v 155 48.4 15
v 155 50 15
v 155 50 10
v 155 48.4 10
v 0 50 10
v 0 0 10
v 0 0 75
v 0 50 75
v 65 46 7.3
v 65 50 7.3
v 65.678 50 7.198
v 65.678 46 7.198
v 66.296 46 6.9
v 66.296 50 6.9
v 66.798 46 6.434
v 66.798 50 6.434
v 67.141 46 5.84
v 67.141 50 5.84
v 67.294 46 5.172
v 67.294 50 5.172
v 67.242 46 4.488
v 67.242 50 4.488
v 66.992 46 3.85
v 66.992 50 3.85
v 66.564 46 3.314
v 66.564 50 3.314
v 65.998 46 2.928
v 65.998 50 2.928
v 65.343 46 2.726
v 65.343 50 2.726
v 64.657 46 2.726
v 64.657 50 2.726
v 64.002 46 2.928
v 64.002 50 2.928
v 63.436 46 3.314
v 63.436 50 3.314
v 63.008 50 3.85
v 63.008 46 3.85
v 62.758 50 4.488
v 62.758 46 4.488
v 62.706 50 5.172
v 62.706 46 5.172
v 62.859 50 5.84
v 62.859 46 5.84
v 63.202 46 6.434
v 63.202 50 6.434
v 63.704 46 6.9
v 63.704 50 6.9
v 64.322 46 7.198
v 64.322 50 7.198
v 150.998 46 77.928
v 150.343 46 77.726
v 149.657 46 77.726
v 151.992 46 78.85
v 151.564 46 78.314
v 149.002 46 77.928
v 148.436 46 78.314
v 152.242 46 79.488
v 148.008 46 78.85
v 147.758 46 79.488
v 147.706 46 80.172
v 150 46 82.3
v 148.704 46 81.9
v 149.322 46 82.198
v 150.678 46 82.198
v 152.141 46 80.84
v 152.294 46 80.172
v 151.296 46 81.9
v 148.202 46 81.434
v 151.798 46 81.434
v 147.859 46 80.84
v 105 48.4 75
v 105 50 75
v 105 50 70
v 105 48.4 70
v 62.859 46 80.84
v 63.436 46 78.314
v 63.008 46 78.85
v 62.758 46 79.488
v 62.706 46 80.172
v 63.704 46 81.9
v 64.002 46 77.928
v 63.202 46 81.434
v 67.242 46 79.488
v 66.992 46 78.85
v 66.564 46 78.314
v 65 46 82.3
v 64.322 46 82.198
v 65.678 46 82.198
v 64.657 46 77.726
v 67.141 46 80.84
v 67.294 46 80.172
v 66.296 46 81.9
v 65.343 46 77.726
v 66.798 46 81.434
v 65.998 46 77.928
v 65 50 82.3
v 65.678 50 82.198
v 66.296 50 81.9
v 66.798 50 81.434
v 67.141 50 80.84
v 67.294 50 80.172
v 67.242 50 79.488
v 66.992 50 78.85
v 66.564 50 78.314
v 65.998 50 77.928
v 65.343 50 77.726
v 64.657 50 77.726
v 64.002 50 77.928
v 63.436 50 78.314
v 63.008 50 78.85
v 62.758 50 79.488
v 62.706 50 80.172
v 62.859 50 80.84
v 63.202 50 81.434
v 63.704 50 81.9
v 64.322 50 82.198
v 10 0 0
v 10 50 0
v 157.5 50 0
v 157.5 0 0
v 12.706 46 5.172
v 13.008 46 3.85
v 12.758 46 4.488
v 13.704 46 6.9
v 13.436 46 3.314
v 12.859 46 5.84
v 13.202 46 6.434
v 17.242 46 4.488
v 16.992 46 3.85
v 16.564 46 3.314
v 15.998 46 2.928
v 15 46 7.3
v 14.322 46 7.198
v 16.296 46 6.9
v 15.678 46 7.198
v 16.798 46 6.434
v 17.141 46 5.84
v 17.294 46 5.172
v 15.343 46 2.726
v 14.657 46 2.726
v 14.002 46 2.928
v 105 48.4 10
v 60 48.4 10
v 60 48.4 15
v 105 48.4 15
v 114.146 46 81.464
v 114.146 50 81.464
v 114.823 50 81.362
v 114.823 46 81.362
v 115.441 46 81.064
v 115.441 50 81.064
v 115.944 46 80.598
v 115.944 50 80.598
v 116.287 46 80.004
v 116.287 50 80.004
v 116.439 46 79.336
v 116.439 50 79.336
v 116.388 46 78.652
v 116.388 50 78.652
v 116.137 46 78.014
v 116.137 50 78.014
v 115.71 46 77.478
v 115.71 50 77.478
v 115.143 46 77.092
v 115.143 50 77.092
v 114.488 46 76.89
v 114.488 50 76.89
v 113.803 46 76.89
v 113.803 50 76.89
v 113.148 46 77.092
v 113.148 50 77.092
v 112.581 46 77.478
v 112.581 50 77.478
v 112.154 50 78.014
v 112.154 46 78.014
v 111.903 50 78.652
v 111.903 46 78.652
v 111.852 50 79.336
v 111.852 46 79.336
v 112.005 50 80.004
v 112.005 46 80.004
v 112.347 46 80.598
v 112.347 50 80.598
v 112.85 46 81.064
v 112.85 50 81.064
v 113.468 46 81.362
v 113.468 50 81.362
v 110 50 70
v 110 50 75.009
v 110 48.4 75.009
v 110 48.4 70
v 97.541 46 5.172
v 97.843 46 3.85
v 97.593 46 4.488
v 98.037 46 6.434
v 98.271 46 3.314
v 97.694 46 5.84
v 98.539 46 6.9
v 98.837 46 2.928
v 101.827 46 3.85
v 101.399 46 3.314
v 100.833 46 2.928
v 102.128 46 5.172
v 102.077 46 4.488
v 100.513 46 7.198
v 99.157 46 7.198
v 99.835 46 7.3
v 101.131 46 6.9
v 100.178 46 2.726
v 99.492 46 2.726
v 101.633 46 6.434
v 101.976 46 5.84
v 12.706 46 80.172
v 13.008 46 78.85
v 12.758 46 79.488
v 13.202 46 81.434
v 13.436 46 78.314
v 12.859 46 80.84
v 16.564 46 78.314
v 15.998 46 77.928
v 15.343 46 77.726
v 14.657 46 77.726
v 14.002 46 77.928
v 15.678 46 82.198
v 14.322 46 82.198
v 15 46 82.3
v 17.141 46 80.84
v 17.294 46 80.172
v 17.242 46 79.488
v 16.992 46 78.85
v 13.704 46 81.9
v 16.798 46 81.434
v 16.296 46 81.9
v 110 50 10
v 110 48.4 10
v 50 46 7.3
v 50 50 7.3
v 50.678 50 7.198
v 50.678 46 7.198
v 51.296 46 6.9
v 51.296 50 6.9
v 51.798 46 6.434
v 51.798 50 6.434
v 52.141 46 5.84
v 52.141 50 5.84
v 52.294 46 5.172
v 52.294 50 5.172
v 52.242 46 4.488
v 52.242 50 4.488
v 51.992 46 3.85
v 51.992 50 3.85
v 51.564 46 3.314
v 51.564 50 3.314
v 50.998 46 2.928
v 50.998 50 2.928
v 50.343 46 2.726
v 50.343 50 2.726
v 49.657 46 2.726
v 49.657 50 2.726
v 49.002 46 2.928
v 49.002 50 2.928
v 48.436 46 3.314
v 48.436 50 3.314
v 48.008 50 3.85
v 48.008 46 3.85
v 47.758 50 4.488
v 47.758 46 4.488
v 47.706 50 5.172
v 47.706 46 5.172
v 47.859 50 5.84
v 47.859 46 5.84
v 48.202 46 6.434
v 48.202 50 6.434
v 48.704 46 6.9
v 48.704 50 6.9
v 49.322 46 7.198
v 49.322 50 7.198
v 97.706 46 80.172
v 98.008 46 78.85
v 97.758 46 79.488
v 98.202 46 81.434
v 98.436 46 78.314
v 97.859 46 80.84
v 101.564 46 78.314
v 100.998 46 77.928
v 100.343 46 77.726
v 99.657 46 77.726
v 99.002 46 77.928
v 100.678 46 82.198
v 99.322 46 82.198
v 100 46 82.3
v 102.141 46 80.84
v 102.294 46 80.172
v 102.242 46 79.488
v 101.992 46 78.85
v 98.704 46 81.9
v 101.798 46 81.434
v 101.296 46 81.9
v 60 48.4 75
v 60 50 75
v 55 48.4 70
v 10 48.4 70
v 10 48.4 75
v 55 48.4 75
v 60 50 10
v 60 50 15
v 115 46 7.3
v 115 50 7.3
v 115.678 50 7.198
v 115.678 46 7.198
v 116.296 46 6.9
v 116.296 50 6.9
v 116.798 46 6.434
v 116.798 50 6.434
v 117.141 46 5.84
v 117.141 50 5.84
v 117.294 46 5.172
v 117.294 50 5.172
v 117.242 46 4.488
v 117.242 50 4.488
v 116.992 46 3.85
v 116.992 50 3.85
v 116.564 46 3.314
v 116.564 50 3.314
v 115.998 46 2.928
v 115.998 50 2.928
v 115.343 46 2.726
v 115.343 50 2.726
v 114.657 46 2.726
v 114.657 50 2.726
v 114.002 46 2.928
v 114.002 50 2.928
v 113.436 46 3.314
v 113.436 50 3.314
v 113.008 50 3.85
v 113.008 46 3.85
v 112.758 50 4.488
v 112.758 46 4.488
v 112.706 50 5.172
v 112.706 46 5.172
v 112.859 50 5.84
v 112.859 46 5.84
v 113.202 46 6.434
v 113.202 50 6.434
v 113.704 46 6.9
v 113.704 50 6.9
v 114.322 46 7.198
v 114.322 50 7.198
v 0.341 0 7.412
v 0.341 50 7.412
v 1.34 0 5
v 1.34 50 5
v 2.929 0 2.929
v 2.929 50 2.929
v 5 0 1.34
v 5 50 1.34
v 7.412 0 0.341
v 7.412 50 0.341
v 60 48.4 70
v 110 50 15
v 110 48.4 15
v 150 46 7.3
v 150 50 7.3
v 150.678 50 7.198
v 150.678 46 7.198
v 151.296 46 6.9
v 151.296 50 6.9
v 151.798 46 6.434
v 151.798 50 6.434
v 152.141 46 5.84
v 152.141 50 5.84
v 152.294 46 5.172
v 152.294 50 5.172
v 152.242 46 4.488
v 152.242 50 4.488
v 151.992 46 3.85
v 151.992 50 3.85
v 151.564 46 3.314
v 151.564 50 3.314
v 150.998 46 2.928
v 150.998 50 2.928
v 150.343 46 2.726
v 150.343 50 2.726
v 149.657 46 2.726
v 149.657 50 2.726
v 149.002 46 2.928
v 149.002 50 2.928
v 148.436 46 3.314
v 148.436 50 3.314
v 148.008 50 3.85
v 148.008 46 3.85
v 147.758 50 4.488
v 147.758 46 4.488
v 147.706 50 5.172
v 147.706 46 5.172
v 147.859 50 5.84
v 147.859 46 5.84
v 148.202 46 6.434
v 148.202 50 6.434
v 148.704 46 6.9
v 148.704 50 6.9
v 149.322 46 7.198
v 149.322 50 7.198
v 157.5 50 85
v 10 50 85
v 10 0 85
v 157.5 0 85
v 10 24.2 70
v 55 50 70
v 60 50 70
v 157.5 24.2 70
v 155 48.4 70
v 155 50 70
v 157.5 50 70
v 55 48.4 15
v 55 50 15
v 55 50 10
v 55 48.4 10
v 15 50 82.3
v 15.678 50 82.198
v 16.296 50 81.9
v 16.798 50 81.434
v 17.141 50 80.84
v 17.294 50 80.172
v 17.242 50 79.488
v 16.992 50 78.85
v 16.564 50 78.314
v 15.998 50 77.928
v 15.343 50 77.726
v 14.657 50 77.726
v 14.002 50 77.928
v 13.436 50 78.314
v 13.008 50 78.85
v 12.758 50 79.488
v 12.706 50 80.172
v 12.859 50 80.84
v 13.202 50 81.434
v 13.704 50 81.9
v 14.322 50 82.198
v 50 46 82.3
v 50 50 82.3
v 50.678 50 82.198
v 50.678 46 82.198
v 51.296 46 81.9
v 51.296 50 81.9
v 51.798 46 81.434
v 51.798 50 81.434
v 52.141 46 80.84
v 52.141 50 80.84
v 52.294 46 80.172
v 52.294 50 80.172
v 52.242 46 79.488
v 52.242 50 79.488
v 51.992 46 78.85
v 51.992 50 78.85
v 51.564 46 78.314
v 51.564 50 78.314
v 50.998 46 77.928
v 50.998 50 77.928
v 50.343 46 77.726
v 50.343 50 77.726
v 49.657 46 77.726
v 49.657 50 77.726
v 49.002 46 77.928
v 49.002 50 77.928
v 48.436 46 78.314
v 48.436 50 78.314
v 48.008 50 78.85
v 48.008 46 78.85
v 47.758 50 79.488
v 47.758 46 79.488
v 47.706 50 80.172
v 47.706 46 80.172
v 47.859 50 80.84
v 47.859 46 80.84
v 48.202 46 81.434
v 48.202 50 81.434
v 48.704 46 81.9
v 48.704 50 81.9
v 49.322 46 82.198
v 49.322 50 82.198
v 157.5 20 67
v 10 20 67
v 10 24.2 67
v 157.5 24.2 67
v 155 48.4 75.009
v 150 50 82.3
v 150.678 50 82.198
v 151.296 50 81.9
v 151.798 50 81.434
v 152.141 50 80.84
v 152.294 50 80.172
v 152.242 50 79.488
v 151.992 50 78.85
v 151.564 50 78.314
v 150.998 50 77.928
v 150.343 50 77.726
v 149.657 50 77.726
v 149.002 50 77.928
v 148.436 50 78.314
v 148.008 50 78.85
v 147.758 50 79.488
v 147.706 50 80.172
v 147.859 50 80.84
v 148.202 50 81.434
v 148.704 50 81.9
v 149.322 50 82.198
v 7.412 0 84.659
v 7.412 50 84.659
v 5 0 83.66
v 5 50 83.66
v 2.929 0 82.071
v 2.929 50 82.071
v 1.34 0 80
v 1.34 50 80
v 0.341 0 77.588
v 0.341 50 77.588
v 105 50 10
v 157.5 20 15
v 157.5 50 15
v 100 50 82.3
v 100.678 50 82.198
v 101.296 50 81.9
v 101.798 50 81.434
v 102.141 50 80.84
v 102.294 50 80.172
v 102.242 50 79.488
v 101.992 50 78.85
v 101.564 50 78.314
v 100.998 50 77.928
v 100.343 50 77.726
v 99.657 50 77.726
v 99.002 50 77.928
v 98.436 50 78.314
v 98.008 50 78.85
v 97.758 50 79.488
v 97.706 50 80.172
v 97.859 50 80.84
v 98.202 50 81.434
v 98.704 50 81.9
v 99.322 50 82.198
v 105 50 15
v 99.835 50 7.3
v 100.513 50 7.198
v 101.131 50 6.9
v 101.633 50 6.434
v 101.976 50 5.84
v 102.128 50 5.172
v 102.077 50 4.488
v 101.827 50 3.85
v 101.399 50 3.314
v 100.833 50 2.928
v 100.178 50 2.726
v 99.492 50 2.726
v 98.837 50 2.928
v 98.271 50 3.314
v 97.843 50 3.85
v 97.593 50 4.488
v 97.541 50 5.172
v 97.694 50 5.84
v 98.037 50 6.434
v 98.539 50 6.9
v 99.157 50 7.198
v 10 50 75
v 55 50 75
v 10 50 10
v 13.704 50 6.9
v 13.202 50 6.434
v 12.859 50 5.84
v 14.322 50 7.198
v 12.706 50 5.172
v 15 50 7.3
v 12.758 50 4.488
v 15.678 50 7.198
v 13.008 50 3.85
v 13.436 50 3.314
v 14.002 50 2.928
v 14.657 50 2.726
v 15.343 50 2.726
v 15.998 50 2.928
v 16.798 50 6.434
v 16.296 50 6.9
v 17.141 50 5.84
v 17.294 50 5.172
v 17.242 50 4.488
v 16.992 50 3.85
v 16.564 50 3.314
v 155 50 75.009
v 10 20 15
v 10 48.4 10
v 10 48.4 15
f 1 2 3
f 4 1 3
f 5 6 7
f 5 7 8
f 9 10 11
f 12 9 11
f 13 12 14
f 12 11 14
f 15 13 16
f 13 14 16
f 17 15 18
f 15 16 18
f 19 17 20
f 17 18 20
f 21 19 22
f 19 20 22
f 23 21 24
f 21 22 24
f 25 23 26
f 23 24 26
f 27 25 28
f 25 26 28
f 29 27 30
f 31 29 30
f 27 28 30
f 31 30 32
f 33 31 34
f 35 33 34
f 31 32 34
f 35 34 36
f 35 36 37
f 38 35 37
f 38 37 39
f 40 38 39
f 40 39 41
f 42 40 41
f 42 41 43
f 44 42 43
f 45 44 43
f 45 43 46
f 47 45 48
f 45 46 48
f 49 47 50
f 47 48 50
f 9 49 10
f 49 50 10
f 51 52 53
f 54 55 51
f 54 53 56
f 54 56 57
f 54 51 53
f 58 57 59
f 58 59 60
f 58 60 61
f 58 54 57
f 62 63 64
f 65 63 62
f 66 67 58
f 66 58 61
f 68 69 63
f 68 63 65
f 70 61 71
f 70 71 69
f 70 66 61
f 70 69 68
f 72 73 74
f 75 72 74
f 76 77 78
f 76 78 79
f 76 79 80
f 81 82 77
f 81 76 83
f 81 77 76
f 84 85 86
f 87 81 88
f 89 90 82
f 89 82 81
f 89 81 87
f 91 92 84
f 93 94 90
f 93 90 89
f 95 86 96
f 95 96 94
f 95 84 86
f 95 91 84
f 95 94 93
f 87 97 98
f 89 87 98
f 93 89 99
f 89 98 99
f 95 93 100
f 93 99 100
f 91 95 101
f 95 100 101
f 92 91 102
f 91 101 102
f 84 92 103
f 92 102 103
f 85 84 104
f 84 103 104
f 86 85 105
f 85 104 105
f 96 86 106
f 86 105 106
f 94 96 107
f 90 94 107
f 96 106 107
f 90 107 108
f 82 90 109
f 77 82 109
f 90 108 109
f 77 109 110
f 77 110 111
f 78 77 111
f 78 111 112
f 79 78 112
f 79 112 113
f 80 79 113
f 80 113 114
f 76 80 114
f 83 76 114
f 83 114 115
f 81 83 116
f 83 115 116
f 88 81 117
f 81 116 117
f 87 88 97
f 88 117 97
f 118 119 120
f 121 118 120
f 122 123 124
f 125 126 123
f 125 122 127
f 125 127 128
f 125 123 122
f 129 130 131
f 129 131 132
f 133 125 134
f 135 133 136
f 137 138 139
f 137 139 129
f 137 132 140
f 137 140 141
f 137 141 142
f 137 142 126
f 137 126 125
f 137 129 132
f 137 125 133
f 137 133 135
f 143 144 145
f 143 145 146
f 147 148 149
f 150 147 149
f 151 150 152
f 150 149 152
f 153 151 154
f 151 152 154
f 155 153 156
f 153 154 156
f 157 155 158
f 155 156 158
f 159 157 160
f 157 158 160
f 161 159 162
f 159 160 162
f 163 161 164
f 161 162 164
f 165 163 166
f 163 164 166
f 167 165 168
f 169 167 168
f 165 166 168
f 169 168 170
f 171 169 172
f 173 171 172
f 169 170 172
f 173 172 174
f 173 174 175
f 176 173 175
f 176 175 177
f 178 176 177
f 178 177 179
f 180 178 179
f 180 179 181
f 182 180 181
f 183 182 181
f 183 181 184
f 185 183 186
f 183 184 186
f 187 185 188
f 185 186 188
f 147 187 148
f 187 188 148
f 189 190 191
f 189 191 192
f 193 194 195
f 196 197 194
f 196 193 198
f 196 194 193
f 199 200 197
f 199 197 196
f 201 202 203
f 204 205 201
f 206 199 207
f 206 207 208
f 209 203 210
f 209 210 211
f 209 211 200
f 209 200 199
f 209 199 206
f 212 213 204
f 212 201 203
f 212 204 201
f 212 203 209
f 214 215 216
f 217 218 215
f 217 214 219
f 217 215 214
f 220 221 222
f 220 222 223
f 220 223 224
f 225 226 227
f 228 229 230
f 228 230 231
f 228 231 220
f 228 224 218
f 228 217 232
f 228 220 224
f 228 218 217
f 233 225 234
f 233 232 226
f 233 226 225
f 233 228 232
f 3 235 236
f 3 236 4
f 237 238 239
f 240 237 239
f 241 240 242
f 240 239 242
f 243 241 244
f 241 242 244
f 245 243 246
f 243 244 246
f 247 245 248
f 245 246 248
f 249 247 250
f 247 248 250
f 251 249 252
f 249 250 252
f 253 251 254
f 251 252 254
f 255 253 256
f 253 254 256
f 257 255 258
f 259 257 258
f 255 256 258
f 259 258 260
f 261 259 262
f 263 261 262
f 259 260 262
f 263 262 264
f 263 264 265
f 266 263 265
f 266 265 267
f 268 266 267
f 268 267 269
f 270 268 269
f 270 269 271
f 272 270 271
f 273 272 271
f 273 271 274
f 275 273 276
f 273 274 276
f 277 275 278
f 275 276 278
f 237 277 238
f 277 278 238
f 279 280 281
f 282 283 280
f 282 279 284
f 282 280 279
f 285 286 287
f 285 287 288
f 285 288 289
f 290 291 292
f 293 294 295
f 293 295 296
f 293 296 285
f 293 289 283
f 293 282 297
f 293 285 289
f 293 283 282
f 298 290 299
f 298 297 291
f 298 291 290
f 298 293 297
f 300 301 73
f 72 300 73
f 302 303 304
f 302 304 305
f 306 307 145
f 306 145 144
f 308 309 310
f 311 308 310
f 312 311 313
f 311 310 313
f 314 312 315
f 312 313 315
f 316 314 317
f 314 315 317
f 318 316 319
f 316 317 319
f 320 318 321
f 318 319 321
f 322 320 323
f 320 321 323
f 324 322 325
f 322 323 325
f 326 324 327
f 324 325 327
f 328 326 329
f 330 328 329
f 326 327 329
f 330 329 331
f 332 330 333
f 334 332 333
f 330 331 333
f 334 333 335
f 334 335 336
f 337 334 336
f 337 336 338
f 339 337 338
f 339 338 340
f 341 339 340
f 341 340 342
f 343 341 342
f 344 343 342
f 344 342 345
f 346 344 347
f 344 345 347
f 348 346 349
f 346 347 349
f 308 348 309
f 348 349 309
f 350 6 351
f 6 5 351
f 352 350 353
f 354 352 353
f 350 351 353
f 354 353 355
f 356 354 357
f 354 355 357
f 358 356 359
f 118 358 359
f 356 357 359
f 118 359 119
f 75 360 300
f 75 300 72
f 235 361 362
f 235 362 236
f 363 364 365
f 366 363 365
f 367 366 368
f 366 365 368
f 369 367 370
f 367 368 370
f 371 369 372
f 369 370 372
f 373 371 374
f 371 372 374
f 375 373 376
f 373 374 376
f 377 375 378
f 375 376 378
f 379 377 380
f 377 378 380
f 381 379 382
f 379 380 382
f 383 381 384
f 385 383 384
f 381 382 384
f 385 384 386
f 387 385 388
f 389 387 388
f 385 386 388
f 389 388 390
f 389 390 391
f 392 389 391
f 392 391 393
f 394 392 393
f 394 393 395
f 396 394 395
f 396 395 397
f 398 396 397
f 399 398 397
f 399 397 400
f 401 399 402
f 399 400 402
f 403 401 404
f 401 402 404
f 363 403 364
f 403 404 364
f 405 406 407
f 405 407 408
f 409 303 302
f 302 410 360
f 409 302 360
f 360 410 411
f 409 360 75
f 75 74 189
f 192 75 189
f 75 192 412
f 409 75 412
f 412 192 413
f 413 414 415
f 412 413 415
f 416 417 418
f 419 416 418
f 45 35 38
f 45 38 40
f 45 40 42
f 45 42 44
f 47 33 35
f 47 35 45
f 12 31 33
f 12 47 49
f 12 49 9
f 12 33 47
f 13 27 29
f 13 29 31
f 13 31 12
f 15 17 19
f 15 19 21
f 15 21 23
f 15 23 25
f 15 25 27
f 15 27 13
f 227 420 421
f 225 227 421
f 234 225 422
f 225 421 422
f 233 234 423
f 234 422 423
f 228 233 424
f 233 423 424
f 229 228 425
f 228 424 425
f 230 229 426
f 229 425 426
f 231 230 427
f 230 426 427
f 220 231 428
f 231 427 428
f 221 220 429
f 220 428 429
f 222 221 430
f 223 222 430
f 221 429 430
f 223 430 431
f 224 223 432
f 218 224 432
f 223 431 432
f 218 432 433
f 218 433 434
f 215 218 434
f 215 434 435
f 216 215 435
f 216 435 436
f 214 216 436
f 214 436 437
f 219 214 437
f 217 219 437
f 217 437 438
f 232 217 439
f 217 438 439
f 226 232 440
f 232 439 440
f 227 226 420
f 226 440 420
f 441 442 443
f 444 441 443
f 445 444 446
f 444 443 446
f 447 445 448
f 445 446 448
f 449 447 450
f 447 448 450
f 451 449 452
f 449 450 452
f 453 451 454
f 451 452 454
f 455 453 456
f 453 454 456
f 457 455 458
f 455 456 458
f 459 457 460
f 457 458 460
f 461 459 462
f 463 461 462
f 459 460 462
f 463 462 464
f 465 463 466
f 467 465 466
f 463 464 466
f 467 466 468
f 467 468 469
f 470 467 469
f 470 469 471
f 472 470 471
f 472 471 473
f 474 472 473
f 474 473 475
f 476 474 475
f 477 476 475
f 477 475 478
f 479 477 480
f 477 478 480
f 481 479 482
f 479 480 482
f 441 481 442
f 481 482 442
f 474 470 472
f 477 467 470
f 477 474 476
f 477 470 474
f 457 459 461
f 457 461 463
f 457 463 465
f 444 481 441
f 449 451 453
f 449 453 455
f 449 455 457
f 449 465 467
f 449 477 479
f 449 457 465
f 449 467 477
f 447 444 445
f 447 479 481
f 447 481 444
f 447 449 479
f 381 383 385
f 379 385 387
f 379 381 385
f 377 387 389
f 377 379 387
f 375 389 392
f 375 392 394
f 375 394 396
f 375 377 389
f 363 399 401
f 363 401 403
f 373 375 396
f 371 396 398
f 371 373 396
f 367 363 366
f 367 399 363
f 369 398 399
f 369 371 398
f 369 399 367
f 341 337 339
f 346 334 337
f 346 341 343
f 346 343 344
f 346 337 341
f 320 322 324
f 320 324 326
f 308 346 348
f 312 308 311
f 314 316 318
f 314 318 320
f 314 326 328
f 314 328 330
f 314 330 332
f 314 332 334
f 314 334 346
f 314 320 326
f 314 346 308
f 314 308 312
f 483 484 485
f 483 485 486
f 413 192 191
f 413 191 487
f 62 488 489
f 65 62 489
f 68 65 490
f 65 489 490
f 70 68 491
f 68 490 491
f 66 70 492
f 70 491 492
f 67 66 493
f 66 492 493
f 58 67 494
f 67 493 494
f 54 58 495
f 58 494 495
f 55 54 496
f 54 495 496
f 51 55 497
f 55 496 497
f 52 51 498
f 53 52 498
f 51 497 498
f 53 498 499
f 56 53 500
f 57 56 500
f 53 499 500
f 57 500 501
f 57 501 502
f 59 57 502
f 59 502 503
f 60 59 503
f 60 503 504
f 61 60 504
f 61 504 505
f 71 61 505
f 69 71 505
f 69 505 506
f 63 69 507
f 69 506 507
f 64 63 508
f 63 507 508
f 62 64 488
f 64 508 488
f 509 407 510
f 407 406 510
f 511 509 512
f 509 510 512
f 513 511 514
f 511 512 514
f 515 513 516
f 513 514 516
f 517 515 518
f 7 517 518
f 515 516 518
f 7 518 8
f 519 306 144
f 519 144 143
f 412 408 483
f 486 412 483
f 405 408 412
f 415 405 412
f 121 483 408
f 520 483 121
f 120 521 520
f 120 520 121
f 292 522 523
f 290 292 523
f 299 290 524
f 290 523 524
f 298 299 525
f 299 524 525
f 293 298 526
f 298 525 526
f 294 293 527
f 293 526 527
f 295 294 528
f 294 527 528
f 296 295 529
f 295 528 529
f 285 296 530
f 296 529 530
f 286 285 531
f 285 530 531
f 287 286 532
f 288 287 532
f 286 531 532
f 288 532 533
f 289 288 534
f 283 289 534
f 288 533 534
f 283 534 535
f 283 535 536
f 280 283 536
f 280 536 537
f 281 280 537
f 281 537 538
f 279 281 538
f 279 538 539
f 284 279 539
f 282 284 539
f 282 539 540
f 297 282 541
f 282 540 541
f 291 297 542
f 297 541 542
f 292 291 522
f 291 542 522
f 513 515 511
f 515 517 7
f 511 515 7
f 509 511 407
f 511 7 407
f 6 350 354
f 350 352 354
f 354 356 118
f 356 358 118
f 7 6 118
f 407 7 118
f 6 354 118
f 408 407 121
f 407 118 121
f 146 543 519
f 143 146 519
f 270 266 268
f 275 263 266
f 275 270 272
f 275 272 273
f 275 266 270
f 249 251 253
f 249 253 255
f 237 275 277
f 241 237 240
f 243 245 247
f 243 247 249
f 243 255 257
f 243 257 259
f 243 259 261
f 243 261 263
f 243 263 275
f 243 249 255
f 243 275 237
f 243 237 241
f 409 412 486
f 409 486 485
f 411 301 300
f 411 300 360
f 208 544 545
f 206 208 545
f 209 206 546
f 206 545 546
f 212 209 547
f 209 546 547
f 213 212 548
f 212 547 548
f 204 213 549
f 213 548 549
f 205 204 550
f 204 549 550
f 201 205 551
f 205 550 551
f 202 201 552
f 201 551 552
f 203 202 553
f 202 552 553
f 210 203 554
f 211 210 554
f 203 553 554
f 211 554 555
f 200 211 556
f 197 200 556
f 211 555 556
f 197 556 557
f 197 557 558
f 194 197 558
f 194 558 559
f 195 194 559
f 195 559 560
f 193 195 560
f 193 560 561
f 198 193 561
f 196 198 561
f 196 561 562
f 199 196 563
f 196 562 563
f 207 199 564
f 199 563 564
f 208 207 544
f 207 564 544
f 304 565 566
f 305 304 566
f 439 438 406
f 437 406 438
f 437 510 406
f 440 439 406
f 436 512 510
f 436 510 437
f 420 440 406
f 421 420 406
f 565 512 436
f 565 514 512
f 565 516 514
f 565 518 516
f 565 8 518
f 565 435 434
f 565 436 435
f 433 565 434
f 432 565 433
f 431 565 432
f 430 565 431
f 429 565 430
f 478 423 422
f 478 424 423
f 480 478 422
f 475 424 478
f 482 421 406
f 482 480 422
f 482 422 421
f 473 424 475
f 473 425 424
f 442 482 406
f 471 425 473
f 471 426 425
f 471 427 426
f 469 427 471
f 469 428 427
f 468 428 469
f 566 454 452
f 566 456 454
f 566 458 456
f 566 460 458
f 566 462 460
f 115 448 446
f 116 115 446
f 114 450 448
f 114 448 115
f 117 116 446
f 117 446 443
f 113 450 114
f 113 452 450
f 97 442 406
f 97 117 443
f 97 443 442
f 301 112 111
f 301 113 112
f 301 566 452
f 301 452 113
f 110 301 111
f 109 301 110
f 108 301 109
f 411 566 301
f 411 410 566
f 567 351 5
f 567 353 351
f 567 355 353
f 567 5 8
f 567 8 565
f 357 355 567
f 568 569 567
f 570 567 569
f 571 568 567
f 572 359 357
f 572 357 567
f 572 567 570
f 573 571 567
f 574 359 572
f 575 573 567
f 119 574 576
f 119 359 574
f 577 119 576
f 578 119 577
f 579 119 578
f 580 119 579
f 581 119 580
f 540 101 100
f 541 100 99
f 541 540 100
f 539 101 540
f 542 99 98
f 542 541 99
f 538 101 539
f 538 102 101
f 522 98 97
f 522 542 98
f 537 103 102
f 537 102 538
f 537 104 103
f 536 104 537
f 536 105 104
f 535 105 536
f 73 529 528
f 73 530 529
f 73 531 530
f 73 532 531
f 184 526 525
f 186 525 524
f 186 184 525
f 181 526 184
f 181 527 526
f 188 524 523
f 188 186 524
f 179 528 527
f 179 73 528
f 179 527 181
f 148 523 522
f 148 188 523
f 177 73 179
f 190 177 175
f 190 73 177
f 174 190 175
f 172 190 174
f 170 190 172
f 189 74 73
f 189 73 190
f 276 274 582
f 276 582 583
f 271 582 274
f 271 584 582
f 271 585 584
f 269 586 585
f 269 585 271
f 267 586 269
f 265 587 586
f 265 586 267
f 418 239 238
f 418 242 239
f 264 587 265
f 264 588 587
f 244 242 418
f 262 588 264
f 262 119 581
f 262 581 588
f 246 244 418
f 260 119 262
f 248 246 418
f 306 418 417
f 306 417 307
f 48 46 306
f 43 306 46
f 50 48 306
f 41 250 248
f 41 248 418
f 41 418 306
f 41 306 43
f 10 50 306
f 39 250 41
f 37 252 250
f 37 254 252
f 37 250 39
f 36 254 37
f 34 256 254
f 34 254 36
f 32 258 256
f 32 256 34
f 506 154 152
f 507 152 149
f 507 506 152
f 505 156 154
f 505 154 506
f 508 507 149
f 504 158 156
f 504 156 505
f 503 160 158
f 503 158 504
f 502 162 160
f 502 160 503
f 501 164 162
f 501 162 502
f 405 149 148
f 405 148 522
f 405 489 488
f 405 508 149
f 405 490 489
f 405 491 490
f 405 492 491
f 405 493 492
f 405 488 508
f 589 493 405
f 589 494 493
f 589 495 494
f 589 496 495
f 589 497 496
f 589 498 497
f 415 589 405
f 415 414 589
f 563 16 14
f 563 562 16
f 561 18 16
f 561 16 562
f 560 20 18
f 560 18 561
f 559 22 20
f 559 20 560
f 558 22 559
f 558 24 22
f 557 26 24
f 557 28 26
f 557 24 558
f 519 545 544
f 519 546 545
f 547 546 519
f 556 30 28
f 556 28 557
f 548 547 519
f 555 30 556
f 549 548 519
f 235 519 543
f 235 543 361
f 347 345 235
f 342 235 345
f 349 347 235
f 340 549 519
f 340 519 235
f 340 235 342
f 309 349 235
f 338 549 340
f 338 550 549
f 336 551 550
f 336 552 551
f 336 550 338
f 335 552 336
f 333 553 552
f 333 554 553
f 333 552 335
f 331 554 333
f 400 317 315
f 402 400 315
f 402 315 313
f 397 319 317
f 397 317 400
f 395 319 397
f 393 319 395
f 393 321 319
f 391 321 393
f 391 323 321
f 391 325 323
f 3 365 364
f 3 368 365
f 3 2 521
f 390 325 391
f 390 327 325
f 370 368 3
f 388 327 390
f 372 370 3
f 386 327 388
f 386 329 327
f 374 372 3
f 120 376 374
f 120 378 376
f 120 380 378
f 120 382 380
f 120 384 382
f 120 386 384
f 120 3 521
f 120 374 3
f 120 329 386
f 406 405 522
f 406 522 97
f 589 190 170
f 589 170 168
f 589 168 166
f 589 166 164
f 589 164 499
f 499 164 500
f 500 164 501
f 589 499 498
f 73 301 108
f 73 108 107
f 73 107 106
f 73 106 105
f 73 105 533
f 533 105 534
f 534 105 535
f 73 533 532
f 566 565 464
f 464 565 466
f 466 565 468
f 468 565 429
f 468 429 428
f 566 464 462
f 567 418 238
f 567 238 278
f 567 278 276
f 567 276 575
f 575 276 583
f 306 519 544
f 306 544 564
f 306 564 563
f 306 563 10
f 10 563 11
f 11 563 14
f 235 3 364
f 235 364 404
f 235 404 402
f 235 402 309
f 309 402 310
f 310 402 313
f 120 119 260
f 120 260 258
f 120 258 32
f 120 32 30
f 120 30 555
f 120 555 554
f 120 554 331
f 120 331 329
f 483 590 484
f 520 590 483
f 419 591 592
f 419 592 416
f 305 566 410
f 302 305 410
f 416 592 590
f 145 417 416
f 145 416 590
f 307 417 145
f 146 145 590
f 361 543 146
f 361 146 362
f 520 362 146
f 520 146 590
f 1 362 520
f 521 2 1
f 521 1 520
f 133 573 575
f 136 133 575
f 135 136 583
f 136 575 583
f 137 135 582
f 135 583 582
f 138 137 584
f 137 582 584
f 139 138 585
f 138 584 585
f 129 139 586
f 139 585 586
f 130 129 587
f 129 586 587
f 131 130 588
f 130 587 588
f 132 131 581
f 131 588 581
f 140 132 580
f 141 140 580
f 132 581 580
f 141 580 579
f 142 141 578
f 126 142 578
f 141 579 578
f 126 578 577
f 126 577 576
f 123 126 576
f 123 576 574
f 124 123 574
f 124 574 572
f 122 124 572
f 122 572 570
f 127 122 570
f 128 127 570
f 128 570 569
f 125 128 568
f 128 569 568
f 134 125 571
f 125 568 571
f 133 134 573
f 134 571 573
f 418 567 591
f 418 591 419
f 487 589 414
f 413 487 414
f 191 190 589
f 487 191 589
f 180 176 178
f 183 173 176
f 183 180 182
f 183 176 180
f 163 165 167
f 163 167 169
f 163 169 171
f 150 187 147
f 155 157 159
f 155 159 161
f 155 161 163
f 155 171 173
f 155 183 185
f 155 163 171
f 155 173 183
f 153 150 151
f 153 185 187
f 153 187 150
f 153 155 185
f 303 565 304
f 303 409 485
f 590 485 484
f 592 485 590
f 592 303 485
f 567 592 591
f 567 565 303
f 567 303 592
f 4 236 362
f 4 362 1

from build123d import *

# Parameters (mm, degrees)
SKIZZE2_W                       = 315
SKIZZE2_H                       = 50
AUFSATZ_LINEAR_AUSTRAGEN1_DEPTH = 85
SKIZZE4_W                       = 295
SKIZZE4_H                       = 55
SCHNITT_LINEAR_AUSTRAGEN1_DEPTH = 30
VERRUNDUNG1_R                   = 10
VERRUNDUNG2_R                   = 10
VERRUNDUNG3_R                   = 10
VERRUNDUNG4_R                   = 10
SKIZZE11_W                      = 45
SKIZZE11_H                      = 5
SKIZZE11_H_2                    = 5.008661904
SCHNITT_LINEAR_AUSTRAGEN4_DEPTH = 1.6
SKIZZE13_W                      = 295
SKIZZE13_H                      = 3
AUFSATZ_LINEAR_AUSTRAGEN2_DEPTH = 4.2
SKIZZE14_W                      = 8
SKIZZE14_H                      = 4
SCHNITT_LINEAR_AUSTRAGEN5_DEPTH = 19
SKIZZE15_W                      = 50
SKIZZE15_H                      = 1.5
AUFSATZ_LINEAR_AUSTRAGEN3_DEPTH = 2
SKIZZE16_W                      = 50
SKIZZE16_H                      = 1.5
AUFSATZ_LINEAR_AUSTRAGEN4_DEPTH = 2
SKIZZE17_R                      = 2.3
SCHNITT_LINEAR_AUSTRAGEN6_DEPTH = 4
SKIZZE19_W                      = 182.800022846
SKIZZE19_H                      = 85
SCHNITT_LINEAR_AUSTRAGEN8_DEPTH = 80


with BuildPart() as part:
    # Skizze2 → Aufsatz-Linear austragen1 (new body)
    with BuildSketch(Plane.XY):
        with Locations((157.5, 25)):
            Rectangle(SKIZZE2_W, SKIZZE2_H)
    extrude(amount=AUFSATZ_LINEAR_AUSTRAGEN1_DEPTH)

    # Skizze4 → Schnitt-Linear austragen1 (cut)
    with BuildSketch(Plane(origin=(0, 50, 0), x_dir=(1, 0, 0), z_dir=(0, 1, 0))):
        with Locations((157.5, -42.5)):
            Rectangle(SKIZZE4_W, SKIZZE4_H)
    extrude(amount=-SCHNITT_LINEAR_AUSTRAGEN1_DEPTH, mode=Mode.SUBTRACT)

    # Verrundung1
    verrundung1_edges = [part.edges().sort_by_distance(p)[0] for p in [
        (315, 25, 0),
    ]]
    fillet(verrundung1_edges, radius=VERRUNDUNG1_R)

    # Verrundung2
    verrundung2_edges = [part.edges().sort_by_distance(p)[0] for p in [
        (315, 25, 85),
    ]]
    fillet(verrundung2_edges, radius=VERRUNDUNG2_R)

    # Verrundung3
    verrundung3_edges = [part.edges().sort_by_distance(p)[0] for p in [
        (0, 25, 85),
    ]]
    fillet(verrundung3_edges, radius=VERRUNDUNG3_R)

    # Verrundung4
    verrundung4_edges = [part.edges().sort_by_distance(p)[0] for p in [
        (0, 25, 0),
    ]]
    fillet(verrundung4_edges, radius=VERRUNDUNG4_R)

    # Skizze11 → Schnitt-Linear austragen4 (cut)
    with BuildSketch(Plane(origin=(0, 50, 0), x_dir=(1, 0, 0), z_dir=(0, 1, 0))):
        with Locations((32.5, -12.5)):
            Rectangle(SKIZZE11_W, SKIZZE11_H)
        with Locations((32.5, -72.5)):
            Rectangle(SKIZZE11_W, SKIZZE11_H)
        with Locations((82.5, -72.5)):
            Rectangle(SKIZZE11_W, SKIZZE11_H)
        with Locations((132.5, -72.504330952)):
            Rectangle(SKIZZE11_W, SKIZZE11_H_2)
        with Locations((182.5, -72.504330952)):
            Rectangle(SKIZZE11_W, SKIZZE11_H_2)
        with Locations((232.5, -72.5)):
            Rectangle(SKIZZE11_W, SKIZZE11_H)
        with Locations((282.5, -72.5)):
            Rectangle(SKIZZE11_W, SKIZZE11_H)
        with Locations((282.5, -12.5)):
            Rectangle(SKIZZE11_W, SKIZZE11_H)
        with Locations((232.5, -12.5)):
            Rectangle(SKIZZE11_W, SKIZZE11_H)
        with Locations((182.5, -12.5)):
            Rectangle(SKIZZE11_W, SKIZZE11_H)
        with Locations((132.5, -12.5)):
            Rectangle(SKIZZE11_W, SKIZZE11_H)
        with Locations((82.5, -12.5)):
            Rectangle(SKIZZE11_W, SKIZZE11_H)
    extrude(amount=-SCHNITT_LINEAR_AUSTRAGEN4_DEPTH, mode=Mode.SUBTRACT)

    # Skizze13 → Aufsatz-Linear austragen2 (add)
    with BuildSketch(Plane(origin=(0, 20, 0), x_dir=(1, 0, 0), z_dir=(0, 1, 0))):
        with Locations((157.5, -68.5)):
            Rectangle(SKIZZE13_W, SKIZZE13_H)
    extrude(amount=AUFSATZ_LINEAR_AUSTRAGEN2_DEPTH)

    # Skizze14 → Schnitt-Linear austragen5 (cut)
    with BuildSketch(Plane.ZY.offset(-305)):
        with Locations((35, 24.4)):
            Rectangle(SKIZZE14_W, SKIZZE14_H)
    extrude(amount=-SCHNITT_LINEAR_AUSTRAGEN5_DEPTH, mode=Mode.SUBTRACT)

    # Skizze15 → Aufsatz-Linear austragen3 (add)
    with BuildSketch(Plane.XY.offset(15)):
        with Locations((280, 23.45)):
            Rectangle(SKIZZE15_W, SKIZZE15_H)
    extrude(amount=AUFSATZ_LINEAR_AUSTRAGEN3_DEPTH)

    # Skizze16 → Aufsatz-Linear austragen4 (add)
    with BuildSketch(Plane(origin=(0, 0, 67), x_dir=(-1, 0, 0), z_dir=(0, 0, -1))):
        with Locations((-280, 23.45)):
            Rectangle(SKIZZE16_W, SKIZZE16_H)
    extrude(amount=AUFSATZ_LINEAR_AUSTRAGEN4_DEPTH)

    # Skizze17 → Schnitt-Linear austragen6 (cut)
    with BuildSketch(Plane(origin=(0, 50, 0), x_dir=(1, 0, 0), z_dir=(0, 1, 0))):
        with Locations(Location((50, -80, 0), (0, 0, 270))):
            Circle(SKIZZE17_R)
        with Locations(Location((15, -80, 0), (0, 0, 270))):
            Circle(SKIZZE17_R)
        with Locations(Location((15, -5, 0), (0, 0, 270))):
            Circle(SKIZZE17_R)
        with Locations(Location((50, -5, 0), (0, 0, 270))):
            Circle(SKIZZE17_R)
        with Locations(Location((65, -5, 0), (0, 0, 270))):
            Circle(SKIZZE17_R)
        with Locations(Location((99.834927097, -5, 0), (0, 0, 270))):
            Circle(SKIZZE17_R)
        with Locations(Location((65, -80, 0), (0, 0, 270))):
            Circle(SKIZZE17_R)
        with Locations(Location((100, -80, 0), (0, 0, 270))):
            Circle(SKIZZE17_R)
        with Locations(Location((114.145512134, -79.164010762, 0), (0, 0, 270))):
            Circle(SKIZZE17_R)
        with Locations(Location((150, -80, 0), (0, 0, 270))):
            Circle(SKIZZE17_R)
        with Locations(Location((165, -80, 0), (0, 0, 270))):
            Circle(SKIZZE17_R)
        with Locations(Location((200, -80, 0), (0, 0, 270))):
            Circle(SKIZZE17_R)
        with Locations(Location((215, -80, 0), (0, 0, 270))):
            Circle(SKIZZE17_R)
        with Locations(Location((250, -80, 0), (0, 0, 270))):
            Circle(SKIZZE17_R)
        with Locations(Location((265, -80, 0), (0, 0, 270))):
            Circle(SKIZZE17_R)
        with Locations(Location((300, -80, 0), (0, 0, 270))):
            Circle(SKIZZE17_R)
        with Locations(Location((300, -5, 0), (0, 0, 270))):
            Circle(SKIZZE17_R)
        with Locations(Location((265, -5, 0), (0, 0, 270))):
            Circle(SKIZZE17_R)
        with Locations(Location((250, -5, 0), (0, 0, 270))):
            Circle(SKIZZE17_R)
        with Locations(Location((215, -5, 0), (0, 0, 270))):
            Circle(SKIZZE17_R)
        with Locations(Location((200, -5, 0), (0, 0, 270))):
            Circle(SKIZZE17_R)
        with Locations(Location((165, -5, 0), (0, 0, 270))):
            Circle(SKIZZE17_R)
        with Locations(Location((150, -5, 0), (0, 0, 270))):
            Circle(SKIZZE17_R)
        with Locations(Location((115, -5, 0), (0, 0, 270))):
            Circle(SKIZZE17_R)
    extrude(amount=-SCHNITT_LINEAR_AUSTRAGEN6_DEPTH, mode=Mode.SUBTRACT)

    # Skizze19 → Schnitt-Linear austragen8 (cut)
    with BuildSketch(Plane(origin=(0, 50, 0), x_dir=(1, 0, 0), z_dir=(0, 1, 0))):
        with Locations((248.900011423, -42.5)):
            Rectangle(SKIZZE19_W, SKIZZE19_H)
    extrude(amount=-SCHNITT_LINEAR_AUSTRAGEN8_DEPTH, mode=Mode.SUBTRACT)


solid = part.part
